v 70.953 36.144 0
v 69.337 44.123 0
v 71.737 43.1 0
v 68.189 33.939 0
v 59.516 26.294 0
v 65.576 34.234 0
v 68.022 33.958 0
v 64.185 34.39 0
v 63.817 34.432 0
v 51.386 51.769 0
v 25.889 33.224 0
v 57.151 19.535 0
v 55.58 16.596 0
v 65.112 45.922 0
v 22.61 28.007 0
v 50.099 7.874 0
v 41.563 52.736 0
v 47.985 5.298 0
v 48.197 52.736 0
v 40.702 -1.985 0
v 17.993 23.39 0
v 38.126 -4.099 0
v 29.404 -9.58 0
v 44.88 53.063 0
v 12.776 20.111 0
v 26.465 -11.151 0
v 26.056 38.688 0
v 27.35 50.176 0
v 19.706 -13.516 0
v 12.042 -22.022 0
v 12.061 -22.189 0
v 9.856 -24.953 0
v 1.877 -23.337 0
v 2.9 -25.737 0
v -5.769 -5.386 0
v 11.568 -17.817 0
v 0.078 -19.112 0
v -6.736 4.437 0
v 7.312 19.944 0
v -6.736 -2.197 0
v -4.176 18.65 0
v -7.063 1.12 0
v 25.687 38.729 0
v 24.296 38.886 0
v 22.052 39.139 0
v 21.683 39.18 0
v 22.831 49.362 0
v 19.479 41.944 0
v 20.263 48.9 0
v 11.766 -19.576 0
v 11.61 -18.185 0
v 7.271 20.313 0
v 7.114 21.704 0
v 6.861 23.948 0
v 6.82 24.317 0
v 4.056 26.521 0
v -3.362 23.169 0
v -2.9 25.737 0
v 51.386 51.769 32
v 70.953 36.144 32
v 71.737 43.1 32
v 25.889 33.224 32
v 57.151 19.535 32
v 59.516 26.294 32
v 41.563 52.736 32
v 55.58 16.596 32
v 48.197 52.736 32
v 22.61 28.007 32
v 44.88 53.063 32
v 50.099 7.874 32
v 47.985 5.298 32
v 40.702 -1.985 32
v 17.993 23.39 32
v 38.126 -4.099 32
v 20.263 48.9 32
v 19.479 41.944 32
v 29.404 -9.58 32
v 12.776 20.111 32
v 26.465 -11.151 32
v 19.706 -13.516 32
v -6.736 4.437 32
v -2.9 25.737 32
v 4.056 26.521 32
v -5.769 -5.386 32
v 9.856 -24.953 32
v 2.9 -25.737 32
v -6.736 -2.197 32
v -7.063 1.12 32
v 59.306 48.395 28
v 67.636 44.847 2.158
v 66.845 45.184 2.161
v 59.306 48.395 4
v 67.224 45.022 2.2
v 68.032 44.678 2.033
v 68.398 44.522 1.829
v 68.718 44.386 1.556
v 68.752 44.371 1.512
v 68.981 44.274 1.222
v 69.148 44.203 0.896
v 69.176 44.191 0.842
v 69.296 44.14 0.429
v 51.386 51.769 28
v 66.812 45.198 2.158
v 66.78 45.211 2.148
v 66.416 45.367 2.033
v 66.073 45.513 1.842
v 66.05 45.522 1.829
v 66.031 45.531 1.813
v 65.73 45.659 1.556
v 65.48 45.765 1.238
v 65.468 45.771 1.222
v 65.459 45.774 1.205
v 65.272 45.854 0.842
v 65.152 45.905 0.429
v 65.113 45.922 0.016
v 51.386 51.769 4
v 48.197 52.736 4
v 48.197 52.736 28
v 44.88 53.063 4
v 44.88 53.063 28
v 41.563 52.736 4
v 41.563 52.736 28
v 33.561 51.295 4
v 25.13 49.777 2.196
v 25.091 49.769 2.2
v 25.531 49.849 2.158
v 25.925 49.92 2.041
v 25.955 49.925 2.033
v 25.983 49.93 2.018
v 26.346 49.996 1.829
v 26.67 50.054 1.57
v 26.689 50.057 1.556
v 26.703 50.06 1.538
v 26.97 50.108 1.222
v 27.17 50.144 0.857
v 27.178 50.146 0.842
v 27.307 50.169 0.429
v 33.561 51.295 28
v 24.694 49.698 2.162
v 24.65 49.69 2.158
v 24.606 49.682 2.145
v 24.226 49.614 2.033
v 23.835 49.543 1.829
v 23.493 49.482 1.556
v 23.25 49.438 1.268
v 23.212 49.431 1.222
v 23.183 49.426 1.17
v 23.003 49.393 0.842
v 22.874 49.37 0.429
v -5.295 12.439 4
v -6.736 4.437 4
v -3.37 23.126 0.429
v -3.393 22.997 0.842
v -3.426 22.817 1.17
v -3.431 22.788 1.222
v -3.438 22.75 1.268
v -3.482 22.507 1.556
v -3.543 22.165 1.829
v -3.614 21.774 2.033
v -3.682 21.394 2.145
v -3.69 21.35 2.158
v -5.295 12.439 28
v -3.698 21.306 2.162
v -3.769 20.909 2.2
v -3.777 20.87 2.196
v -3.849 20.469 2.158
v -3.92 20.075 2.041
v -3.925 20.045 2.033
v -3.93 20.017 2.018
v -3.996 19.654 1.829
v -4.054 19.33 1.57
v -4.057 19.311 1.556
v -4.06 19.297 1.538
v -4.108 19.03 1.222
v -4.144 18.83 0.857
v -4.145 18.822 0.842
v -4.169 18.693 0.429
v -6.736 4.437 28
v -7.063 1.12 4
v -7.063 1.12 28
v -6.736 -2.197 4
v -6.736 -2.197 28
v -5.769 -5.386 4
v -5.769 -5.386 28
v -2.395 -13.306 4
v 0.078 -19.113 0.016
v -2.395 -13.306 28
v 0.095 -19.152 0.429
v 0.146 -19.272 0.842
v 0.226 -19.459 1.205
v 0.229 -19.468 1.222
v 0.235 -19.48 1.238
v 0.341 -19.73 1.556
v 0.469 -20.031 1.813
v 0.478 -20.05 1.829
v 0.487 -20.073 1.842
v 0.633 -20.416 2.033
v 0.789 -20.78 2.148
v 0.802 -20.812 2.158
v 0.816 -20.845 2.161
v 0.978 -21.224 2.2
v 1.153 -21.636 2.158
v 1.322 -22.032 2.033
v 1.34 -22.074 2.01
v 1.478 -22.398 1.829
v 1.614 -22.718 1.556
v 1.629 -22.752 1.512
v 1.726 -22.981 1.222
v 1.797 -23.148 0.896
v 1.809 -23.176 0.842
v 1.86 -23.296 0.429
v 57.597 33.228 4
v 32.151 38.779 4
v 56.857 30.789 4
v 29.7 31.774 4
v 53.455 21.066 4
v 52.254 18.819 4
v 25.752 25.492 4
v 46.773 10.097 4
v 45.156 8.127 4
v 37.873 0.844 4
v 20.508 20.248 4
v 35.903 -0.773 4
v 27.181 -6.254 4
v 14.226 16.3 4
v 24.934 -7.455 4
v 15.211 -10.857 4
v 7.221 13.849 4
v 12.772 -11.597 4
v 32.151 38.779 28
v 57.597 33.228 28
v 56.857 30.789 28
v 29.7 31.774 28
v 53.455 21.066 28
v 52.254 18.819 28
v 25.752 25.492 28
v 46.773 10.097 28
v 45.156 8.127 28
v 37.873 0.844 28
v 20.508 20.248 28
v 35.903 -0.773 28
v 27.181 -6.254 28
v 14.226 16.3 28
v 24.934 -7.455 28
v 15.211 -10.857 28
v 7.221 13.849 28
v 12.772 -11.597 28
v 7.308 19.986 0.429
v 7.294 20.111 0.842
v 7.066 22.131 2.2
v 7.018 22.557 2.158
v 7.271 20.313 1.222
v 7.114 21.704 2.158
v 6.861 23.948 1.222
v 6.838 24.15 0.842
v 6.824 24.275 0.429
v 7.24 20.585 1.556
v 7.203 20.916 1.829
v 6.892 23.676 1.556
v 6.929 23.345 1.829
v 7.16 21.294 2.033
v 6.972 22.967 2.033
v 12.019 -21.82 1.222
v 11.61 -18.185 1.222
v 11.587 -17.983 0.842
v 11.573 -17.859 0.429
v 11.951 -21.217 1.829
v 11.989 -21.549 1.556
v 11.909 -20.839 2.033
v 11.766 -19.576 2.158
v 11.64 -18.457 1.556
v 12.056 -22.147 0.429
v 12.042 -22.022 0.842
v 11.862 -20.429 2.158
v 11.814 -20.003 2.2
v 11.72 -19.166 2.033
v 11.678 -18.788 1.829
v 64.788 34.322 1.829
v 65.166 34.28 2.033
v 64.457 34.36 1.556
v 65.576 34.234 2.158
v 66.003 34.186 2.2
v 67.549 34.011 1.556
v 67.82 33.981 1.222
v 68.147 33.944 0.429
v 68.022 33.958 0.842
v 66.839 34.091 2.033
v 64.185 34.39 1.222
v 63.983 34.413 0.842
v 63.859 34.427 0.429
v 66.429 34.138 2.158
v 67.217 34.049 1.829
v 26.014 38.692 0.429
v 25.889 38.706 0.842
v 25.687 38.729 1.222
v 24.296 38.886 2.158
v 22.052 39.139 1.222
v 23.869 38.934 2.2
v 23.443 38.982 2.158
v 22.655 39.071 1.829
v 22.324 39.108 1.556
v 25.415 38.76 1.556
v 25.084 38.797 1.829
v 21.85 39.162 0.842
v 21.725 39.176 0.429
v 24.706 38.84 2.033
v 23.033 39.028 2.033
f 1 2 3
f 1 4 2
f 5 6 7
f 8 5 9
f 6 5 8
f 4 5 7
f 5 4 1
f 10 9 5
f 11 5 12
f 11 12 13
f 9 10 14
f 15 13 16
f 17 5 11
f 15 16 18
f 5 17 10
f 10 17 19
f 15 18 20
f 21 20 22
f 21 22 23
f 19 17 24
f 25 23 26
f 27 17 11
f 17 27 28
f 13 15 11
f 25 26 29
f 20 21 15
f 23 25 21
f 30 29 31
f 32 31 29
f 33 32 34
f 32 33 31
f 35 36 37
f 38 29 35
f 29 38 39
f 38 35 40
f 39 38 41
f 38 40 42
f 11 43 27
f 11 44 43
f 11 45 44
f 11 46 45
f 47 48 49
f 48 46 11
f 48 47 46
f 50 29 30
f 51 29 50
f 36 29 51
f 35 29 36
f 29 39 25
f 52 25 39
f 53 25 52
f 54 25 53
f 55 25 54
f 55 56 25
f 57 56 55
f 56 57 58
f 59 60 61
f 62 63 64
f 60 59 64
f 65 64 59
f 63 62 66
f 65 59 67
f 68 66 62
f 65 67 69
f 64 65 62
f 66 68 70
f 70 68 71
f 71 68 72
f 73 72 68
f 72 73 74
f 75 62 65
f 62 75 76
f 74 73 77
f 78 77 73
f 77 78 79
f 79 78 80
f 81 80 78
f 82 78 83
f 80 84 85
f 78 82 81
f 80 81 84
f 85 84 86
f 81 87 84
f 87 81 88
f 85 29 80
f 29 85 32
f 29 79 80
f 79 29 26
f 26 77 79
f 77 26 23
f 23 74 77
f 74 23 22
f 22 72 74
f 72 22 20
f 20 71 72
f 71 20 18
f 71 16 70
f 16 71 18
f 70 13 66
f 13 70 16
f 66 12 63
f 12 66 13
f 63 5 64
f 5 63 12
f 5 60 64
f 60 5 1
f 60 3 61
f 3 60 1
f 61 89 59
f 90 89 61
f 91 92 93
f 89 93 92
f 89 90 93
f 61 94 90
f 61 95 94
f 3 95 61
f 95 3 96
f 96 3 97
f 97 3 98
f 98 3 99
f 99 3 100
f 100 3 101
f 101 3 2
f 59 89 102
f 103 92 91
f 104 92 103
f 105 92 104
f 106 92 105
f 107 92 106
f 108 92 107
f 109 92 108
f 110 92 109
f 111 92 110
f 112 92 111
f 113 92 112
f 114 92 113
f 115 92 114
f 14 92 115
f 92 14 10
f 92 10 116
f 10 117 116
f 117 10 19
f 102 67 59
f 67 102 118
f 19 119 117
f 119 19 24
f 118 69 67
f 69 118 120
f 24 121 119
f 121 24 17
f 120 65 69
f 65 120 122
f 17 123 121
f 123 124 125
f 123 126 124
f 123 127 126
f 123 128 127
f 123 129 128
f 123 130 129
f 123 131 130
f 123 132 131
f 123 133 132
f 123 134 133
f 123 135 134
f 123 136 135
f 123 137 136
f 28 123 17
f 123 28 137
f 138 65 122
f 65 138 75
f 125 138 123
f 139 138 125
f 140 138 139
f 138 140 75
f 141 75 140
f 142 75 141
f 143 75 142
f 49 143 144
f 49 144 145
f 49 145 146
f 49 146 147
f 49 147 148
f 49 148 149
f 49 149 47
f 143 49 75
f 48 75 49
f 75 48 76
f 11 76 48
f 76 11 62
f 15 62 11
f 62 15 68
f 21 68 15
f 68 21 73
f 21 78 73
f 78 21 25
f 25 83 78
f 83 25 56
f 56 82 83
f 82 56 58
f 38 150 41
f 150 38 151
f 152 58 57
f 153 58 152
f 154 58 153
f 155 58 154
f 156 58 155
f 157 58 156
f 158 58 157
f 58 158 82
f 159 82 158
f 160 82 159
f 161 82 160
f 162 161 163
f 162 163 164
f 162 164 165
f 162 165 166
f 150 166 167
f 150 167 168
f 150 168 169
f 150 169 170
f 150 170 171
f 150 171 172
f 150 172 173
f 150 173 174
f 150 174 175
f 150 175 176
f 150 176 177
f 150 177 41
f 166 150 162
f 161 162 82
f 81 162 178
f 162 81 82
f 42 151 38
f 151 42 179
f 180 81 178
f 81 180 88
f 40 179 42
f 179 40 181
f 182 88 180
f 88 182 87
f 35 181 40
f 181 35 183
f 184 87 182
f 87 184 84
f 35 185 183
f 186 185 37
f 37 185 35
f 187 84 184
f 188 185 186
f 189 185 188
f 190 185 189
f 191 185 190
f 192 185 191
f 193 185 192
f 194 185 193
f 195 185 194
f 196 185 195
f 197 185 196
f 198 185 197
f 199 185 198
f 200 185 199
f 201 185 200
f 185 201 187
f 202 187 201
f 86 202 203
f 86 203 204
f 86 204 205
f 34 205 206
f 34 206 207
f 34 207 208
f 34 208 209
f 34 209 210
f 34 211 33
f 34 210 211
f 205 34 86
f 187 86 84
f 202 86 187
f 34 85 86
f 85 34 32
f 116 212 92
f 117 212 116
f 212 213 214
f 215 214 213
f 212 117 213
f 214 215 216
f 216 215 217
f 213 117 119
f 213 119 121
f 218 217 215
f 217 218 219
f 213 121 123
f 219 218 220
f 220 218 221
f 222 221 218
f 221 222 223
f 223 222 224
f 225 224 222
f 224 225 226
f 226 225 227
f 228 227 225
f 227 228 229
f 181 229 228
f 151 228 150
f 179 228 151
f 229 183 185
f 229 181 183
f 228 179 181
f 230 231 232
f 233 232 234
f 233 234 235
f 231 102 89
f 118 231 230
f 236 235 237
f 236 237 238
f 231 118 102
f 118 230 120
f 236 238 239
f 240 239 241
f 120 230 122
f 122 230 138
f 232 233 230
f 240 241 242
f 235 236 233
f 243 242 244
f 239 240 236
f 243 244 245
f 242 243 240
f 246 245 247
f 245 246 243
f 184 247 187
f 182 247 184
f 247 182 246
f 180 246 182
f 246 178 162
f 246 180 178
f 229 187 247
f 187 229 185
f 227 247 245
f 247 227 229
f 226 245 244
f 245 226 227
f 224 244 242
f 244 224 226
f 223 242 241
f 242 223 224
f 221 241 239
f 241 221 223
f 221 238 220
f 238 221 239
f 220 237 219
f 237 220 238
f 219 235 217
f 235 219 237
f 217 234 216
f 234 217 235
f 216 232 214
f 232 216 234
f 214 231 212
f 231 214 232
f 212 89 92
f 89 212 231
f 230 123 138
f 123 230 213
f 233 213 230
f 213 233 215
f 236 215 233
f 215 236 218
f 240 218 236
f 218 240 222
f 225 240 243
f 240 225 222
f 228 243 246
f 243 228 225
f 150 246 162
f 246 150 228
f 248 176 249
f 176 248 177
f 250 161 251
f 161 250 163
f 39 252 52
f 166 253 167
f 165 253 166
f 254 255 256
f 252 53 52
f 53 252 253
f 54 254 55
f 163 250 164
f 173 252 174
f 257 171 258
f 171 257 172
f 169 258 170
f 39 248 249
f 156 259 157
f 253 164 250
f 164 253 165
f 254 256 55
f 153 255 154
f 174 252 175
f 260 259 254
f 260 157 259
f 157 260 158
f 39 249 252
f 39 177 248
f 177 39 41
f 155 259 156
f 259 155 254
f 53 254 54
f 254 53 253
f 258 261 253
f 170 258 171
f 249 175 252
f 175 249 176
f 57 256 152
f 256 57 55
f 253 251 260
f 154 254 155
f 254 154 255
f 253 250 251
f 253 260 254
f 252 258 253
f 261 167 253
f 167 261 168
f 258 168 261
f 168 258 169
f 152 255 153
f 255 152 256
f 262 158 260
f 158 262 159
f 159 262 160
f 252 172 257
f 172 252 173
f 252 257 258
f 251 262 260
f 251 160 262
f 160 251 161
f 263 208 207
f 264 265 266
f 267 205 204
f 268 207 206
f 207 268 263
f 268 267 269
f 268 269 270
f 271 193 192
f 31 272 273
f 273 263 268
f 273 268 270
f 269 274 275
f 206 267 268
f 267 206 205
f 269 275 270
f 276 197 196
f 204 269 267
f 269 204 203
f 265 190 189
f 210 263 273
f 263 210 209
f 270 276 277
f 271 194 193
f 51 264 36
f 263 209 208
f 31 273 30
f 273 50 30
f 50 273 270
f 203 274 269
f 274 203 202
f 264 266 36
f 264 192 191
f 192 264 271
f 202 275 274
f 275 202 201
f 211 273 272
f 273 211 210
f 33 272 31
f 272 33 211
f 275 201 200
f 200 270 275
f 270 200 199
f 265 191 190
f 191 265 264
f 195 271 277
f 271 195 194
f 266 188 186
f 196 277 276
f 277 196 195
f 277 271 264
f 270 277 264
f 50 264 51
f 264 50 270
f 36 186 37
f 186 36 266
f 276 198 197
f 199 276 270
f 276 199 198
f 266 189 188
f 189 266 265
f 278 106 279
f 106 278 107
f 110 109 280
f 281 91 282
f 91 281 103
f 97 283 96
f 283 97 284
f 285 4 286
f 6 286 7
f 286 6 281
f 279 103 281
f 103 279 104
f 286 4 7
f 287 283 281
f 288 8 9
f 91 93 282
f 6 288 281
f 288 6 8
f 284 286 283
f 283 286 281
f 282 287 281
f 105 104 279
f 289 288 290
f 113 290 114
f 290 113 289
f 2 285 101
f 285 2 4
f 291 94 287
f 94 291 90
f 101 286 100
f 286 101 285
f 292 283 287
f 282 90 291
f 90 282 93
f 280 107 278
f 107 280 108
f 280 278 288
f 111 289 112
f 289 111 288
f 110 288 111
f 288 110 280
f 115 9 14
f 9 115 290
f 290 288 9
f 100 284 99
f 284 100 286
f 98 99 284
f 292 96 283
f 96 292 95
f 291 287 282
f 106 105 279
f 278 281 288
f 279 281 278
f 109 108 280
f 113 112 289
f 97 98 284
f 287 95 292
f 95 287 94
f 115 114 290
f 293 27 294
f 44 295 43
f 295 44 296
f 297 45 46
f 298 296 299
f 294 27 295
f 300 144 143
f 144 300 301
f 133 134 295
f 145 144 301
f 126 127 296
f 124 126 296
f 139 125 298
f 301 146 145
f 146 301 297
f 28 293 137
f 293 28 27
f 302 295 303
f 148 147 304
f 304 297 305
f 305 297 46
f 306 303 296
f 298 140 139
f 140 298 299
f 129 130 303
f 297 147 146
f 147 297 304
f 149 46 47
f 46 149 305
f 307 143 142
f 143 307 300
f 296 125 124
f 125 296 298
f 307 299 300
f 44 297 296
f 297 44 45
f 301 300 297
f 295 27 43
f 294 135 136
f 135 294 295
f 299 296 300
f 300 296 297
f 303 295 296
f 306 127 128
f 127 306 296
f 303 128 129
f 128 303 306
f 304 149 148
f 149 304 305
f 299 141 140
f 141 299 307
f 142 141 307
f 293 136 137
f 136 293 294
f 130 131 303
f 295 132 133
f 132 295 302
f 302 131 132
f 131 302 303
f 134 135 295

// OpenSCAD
$fn = 32;

// ----------------------------------------------------------------------
// Air duct: 34 mm duct, 4 mm wall, 32 mm across
// ----------------------------------------------------------------------

// --- parameters (mm) ---
duct_r = 17;              // duct core radius
duct_d = 34;              // duct core diameter
wall = 4;                 // duct wall thickness
height = 32;              // duct width (extrusion height)
port_r = 25.9;            // port flange half width
port_d = 51.8;            // port flange width
port_t = 7;               // port flange thickness
bolt_d = 4.4;             // port bolt holes
bolt_offset = 21.2;       // bolt hole offset from the port axis

difference() {
  /* outer hull chain: tube with a flat flange plate at every port */
  linear_extrude(height = 32) {
    hull() {
      polygon([[2.9, -25.737], [-2.9, 25.737], [4.056, 26.521], [9.856, -24.953]]);
      translate([9.937, 1.12]) circle(r = 17);
    }
    hull() {
      translate([9.937, 1.12]) circle(r = 17);
      translate([10.236, 1.153]) circle(r = 17);
    }
    hull() {
      translate([10.236, 1.153]) circle(r = 17);
      translate([19.959, 4.555]) circle(r = 17);
    }
    hull() {
      translate([19.959, 4.555]) circle(r = 17);
      translate([28.681, 10.036]) circle(r = 17);
    }
    hull() {
      translate([28.681, 10.036]) circle(r = 17);
      translate([35.964, 17.319]) circle(r = 17);
    }
    hull() {
      translate([35.964, 17.319]) circle(r = 17);
      translate([41.445, 26.041]) circle(r = 17);
    }
    hull() {
      translate([41.445, 26.041]) circle(r = 17);
      translate([44.847, 35.764]) circle(r = 17);
    }
    hull() {
      translate([44.847, 35.764]) circle(r = 17);
      translate([44.88, 36.063]) circle(r = 17);
    }
    hull() {
      translate([44.88, 36.063]) circle(r = 17);
      polygon([[20.263, 48.9], [71.737, 43.1], [70.953, 36.144], [19.479, 41.944]]);
    }
  }
  /* air passage: the same chain inset by the wall, 5 mm proud of the ports */
  translate([0, 0, 4]) linear_extrude(height = 24) {
    hull() {
      translate([-4.969, -0.56]) circle(r = 13);
      translate([10.236, 1.153]) circle(r = 13);
    }
    hull() {
      translate([10.236, 1.153]) circle(r = 13);
      translate([19.959, 4.555]) circle(r = 13);
    }
    hull() {
      translate([19.959, 4.555]) circle(r = 13);
      translate([28.681, 10.036]) circle(r = 13);
    }
    hull() {
      translate([28.681, 10.036]) circle(r = 13);
      translate([35.964, 17.319]) circle(r = 13);
    }
    hull() {
      translate([35.964, 17.319]) circle(r = 13);
      translate([41.445, 26.041]) circle(r = 13);
    }
    hull() {
      translate([41.445, 26.041]) circle(r = 13);
      translate([44.847, 35.764]) circle(r = 13);
    }
    hull() {
      translate([44.847, 35.764]) circle(r = 13);
      translate([46.56, 50.969]) circle(r = 13);
    }
  }
  translate([0, 0]) rotate([0, 0, -83.57]) translate([-21.2, -2.5]) rotate([-90, 0, 0]) cylinder(h = 12, d = 4.4);
  translate([0, 0]) rotate([0, 0, -83.57]) translate([21.2, -2.5]) rotate([-90, 0, 0]) cylinder(h = 12, d = 4.4);
  translate([46, 46]) rotate([0, 0, 173.57]) translate([-21.2, -2.5]) rotate([-90, 0, 0]) cylinder(h = 12, d = 4.4);
  translate([46, 46]) rotate([0, 0, 173.57]) translate([21.2, -2.5]) rotate([-90, 0, 0]) cylinder(h = 12, d = 4.4);
}
